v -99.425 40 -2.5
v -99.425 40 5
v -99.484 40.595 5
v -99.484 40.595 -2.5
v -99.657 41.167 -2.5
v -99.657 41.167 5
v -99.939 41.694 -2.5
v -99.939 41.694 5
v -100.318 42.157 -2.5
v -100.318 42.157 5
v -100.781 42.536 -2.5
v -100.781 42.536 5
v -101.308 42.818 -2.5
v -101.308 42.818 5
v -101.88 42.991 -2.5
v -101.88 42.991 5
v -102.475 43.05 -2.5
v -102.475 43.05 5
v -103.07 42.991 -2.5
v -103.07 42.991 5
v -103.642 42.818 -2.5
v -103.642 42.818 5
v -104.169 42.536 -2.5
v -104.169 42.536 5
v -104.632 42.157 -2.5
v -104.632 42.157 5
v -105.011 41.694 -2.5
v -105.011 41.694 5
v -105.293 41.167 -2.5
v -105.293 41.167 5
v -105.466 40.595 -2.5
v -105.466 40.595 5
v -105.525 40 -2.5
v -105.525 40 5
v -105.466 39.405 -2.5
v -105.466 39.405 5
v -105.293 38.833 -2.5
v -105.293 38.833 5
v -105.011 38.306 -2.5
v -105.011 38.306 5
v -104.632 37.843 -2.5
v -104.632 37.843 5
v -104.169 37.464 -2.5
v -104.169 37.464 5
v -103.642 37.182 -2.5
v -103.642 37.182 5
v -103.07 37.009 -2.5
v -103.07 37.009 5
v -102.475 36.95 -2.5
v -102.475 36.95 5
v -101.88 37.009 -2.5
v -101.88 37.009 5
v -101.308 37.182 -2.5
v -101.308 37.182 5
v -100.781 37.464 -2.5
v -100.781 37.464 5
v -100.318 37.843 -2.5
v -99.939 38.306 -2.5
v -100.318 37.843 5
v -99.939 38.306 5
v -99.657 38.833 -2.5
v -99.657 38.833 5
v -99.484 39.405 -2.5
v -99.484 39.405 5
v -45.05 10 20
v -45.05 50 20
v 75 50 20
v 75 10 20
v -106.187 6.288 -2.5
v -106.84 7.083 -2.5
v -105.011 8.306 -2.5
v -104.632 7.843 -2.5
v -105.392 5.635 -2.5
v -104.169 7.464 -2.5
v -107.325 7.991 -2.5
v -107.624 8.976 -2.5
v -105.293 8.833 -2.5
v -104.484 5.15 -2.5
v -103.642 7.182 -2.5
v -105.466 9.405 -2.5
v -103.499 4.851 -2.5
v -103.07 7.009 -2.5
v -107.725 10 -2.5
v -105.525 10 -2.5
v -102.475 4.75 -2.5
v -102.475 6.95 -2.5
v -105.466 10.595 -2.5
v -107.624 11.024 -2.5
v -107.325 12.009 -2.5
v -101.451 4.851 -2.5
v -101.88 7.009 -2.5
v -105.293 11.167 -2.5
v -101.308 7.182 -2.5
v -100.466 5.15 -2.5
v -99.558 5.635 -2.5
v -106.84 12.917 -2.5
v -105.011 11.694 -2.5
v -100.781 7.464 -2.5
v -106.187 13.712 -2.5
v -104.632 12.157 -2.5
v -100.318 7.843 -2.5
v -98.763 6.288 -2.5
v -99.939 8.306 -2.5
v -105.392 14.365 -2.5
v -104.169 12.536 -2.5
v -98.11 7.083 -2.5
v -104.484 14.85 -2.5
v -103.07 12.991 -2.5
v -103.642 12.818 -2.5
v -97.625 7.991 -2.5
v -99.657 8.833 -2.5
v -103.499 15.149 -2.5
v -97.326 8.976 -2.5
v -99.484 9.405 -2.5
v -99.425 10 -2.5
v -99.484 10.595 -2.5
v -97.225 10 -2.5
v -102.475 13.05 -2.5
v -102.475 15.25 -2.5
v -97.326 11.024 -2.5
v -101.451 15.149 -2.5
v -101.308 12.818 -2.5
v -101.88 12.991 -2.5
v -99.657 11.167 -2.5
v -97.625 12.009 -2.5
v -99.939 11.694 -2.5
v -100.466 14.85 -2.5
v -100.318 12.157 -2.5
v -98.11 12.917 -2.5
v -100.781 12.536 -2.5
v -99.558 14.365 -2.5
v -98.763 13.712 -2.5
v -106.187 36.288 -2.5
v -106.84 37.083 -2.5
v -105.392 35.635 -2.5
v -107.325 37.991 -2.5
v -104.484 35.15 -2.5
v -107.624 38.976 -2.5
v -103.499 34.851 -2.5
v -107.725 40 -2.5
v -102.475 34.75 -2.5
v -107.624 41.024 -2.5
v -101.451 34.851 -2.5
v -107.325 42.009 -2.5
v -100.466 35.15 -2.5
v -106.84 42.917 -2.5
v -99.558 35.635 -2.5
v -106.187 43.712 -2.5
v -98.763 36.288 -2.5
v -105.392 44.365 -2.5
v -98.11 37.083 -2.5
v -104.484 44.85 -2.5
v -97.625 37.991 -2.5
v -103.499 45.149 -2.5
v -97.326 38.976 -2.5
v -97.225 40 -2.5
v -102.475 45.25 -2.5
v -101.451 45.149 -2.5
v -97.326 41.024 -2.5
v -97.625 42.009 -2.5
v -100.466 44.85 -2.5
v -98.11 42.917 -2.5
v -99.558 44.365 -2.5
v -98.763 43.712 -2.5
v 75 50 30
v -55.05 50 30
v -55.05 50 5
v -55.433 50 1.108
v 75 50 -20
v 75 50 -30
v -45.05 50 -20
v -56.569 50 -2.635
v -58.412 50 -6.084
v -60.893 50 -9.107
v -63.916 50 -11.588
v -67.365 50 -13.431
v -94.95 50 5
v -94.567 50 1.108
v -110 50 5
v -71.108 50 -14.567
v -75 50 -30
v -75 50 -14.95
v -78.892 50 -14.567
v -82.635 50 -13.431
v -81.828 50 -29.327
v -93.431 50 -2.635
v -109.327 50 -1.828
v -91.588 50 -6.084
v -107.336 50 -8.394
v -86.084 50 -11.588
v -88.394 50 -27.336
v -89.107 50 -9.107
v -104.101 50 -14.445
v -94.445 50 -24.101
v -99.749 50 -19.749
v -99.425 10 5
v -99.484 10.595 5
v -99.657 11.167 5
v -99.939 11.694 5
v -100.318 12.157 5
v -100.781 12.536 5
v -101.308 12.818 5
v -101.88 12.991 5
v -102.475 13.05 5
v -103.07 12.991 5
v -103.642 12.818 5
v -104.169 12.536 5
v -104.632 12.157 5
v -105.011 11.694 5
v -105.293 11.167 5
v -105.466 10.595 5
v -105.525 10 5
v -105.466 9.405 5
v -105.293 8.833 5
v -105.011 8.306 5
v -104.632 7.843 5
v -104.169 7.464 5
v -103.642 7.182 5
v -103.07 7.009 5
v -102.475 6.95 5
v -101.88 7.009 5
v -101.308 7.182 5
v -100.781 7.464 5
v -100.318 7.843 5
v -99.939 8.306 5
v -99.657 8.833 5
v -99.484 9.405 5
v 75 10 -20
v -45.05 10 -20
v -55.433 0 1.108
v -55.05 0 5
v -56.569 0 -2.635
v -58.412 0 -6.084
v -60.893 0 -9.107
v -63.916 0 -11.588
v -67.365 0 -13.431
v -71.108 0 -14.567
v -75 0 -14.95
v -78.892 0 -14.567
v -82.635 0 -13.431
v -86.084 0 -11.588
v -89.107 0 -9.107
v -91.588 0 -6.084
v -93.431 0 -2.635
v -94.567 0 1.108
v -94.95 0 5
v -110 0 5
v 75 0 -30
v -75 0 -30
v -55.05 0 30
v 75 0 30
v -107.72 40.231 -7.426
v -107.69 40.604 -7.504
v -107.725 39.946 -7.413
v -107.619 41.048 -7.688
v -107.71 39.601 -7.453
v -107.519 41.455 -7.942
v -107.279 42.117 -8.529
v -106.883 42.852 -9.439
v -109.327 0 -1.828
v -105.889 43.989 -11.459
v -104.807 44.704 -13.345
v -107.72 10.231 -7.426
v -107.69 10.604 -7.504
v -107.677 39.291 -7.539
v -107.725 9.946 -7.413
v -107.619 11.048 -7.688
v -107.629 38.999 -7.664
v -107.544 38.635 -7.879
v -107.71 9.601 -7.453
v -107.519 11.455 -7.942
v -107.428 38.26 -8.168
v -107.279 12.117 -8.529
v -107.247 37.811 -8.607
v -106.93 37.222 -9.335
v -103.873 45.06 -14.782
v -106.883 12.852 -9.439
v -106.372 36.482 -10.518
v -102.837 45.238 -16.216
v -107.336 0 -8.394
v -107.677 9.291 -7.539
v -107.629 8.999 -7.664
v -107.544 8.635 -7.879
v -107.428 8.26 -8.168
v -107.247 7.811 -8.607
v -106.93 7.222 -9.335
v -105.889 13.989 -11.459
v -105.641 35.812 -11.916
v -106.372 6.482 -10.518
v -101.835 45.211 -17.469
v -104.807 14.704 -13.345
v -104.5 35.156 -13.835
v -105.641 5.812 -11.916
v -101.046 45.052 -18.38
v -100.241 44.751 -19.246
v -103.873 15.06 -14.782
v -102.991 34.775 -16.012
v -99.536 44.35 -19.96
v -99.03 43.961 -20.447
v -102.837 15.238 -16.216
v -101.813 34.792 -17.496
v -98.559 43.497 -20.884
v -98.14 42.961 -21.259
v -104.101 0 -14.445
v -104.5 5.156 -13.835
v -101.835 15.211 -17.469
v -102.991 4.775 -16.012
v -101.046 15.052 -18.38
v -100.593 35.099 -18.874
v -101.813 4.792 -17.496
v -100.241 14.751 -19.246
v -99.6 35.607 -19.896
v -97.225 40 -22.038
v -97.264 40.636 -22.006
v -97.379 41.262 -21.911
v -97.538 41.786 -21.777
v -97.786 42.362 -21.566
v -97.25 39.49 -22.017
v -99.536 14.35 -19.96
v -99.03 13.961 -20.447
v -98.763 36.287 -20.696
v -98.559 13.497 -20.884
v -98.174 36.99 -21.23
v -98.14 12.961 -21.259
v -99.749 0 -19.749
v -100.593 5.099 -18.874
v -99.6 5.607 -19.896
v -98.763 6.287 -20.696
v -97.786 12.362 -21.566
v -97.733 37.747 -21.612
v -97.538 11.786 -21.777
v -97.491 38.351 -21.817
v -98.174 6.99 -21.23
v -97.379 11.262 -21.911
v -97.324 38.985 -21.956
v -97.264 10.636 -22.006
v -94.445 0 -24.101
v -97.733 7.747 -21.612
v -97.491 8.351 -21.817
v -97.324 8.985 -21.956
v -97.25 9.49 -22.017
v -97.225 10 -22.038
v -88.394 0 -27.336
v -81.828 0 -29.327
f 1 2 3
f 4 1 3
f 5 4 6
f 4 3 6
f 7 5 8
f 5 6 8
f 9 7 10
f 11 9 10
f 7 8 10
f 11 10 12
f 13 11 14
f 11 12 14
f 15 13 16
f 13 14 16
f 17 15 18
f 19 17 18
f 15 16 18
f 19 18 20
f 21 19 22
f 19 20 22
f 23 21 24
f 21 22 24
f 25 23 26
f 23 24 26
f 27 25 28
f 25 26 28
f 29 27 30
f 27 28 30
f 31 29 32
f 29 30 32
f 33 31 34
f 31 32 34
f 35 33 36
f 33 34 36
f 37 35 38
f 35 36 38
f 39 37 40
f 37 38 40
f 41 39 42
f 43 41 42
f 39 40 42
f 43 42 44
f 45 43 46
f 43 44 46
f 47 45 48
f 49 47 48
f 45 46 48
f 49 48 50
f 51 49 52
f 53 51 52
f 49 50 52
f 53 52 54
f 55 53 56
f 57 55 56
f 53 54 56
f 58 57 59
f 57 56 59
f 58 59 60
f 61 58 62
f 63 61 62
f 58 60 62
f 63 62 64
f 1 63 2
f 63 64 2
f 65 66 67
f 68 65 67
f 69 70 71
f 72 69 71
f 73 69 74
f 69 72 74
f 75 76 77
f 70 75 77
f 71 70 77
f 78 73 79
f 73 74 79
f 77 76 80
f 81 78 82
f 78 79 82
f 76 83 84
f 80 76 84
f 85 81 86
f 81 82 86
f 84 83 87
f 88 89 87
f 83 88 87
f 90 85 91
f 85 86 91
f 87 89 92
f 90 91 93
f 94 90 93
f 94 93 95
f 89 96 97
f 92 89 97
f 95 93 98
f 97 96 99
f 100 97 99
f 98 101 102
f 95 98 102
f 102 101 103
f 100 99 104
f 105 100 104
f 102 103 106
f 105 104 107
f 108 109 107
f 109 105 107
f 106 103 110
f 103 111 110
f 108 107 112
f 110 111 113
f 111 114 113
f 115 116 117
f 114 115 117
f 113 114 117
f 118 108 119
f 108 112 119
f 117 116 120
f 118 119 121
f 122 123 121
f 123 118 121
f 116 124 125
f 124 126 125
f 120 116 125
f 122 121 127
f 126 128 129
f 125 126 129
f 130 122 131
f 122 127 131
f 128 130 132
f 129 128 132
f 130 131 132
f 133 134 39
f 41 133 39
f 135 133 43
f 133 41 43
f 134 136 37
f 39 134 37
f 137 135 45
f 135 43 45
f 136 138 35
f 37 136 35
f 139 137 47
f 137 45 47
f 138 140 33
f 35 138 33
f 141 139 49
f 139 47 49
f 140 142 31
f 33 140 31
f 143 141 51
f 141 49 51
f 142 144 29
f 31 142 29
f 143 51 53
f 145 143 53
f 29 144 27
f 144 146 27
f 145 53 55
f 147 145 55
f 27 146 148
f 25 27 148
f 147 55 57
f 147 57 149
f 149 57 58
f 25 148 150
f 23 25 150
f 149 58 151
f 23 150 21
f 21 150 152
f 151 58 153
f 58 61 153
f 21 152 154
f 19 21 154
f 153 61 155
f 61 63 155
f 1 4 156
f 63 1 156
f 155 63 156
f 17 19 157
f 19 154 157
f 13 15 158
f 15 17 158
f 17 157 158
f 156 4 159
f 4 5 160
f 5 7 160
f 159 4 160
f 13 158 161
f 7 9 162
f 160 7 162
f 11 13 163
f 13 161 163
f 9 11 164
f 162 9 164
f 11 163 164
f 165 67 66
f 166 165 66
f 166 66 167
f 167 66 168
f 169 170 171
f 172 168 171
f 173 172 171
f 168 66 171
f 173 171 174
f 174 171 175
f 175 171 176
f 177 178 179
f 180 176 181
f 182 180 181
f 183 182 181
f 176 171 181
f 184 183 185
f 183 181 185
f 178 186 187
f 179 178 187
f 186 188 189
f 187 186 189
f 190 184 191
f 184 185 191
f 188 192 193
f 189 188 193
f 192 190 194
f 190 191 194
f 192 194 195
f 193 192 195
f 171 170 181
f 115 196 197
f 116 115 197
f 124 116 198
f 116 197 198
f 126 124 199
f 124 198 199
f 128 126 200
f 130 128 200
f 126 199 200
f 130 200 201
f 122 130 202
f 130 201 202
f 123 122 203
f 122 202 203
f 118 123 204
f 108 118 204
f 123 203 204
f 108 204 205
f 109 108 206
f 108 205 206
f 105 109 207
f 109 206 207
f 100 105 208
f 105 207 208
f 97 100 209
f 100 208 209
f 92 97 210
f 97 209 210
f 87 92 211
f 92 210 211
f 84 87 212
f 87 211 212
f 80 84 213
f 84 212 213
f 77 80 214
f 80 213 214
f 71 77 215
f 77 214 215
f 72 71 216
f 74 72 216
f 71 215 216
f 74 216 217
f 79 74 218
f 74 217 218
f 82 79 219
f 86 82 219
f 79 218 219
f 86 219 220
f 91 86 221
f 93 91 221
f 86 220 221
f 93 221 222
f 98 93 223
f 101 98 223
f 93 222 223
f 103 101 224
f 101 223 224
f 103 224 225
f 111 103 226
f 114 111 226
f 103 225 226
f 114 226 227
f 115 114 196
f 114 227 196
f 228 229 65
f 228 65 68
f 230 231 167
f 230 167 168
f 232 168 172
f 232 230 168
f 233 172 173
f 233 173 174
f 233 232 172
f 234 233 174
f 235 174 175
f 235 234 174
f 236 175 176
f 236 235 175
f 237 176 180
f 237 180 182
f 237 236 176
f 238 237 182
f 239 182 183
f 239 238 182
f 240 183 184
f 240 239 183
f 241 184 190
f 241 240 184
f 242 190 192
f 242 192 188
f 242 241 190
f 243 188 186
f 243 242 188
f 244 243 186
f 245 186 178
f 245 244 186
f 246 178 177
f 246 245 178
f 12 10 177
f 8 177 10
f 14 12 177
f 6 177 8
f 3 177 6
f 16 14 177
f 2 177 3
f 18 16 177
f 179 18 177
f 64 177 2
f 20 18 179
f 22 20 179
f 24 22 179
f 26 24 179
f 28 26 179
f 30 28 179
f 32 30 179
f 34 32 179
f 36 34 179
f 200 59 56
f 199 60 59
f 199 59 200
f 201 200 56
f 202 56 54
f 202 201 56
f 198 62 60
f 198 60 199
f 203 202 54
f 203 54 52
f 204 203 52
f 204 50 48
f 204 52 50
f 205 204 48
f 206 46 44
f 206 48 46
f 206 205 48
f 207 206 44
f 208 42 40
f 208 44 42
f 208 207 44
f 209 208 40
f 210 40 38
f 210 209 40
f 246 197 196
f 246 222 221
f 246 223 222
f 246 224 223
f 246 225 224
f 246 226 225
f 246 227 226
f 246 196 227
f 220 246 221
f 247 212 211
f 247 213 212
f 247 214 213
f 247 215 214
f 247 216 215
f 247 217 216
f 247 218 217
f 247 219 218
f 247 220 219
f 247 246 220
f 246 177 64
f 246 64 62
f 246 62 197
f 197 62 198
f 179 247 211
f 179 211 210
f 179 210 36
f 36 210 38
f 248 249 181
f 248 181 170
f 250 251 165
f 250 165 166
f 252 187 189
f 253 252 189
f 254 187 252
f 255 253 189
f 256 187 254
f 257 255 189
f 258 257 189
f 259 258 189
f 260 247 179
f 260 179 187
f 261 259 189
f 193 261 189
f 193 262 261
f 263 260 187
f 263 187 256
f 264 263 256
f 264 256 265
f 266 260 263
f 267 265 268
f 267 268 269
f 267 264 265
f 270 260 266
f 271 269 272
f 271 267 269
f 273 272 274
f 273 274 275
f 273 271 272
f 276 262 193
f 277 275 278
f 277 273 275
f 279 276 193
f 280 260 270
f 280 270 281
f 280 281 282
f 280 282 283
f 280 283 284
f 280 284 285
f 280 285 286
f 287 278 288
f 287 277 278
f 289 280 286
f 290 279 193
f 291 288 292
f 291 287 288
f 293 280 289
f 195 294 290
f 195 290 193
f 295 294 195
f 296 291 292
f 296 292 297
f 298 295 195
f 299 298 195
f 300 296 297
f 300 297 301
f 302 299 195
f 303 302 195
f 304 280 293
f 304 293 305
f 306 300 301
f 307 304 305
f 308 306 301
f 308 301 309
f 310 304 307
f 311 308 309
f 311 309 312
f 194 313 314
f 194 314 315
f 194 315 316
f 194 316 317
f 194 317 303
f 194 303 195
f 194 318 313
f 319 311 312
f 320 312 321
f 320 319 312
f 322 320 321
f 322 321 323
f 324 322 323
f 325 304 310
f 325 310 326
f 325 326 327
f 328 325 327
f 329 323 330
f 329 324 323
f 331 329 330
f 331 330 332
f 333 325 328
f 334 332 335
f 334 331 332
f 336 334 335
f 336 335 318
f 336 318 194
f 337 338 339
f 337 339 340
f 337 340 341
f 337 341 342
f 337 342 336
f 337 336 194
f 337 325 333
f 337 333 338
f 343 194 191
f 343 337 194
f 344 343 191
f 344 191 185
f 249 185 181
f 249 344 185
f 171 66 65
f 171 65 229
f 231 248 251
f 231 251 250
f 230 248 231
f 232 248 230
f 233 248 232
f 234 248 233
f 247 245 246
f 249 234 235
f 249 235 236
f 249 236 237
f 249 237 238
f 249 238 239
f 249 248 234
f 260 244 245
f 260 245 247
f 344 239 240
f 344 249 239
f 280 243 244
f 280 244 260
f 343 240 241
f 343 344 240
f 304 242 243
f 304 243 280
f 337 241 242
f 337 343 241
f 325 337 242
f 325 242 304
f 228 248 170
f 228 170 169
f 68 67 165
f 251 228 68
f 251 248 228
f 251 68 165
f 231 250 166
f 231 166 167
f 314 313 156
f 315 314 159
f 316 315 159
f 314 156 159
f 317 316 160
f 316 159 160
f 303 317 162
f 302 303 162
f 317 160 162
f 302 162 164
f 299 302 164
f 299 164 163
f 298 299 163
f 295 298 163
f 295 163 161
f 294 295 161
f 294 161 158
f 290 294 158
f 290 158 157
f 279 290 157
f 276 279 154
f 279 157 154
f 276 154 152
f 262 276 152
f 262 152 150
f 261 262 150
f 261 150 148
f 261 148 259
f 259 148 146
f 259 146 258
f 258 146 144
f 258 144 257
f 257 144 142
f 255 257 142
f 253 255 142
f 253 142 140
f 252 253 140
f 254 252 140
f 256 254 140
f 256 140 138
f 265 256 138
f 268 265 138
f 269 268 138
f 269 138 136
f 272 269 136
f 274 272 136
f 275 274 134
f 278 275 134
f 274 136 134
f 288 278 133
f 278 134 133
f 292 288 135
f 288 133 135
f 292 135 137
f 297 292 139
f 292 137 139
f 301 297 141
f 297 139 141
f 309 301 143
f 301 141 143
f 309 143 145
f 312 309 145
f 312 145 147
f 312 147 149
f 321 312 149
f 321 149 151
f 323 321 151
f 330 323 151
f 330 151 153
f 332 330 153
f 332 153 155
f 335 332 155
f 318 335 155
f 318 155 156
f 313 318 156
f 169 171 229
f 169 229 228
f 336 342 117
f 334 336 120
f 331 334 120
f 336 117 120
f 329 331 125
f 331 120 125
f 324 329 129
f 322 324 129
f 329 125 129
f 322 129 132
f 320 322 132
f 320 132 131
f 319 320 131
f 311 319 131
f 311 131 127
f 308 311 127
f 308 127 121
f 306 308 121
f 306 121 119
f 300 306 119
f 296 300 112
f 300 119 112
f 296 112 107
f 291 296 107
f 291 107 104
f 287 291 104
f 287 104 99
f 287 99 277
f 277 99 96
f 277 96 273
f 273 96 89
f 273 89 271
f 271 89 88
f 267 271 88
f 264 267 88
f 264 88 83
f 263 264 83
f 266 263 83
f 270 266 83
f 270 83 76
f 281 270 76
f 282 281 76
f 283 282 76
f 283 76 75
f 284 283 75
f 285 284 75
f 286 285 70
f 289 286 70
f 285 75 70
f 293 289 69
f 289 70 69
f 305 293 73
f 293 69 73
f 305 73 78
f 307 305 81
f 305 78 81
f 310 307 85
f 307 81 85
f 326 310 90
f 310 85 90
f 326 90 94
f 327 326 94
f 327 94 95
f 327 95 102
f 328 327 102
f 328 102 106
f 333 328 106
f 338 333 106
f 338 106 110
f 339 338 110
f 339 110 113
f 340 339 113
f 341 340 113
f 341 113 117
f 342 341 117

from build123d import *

# Parameters (mm, degrees)
BOSS_EXTRUDE1_DEPTH = 50
SKETCH3_R           = 3.05
CUT_EXTRUDE1_DEPTH  = 7.5
SKETCH4_R           = 5.25
CUT_EXTRUDE2_DEPTH  = 50
SKETCH5_W           = 148.528027858
SKETCH5_H           = 40
CUT_EXTRUDE3_DEPTH  = 40


with BuildPart() as part:
    # Sketch2 → Boss-Extrude1 (new body)
    with BuildSketch(Plane(origin=(0, 0, 0), x_dir=(1, 0, 0), z_dir=(0, 1, 0))):
        with BuildLine():
            Line((-75, 30), (75, 30))
            Line((75, 30), (75, -30))
            Line((75, -30), (-55.05, -30))
            Line((-55.05, -30), (-55.05, -5))
            ThreePointArc((-55.05, -5), (-75, 14.95), (-94.95, -5))
            Line((-94.95, -5), (-110, -5))
            ThreePointArc((-110, -5), (-99.748737342, 19.748737342), (-75, 30))
        make_face()
    extrude(amount=BOSS_EXTRUDE1_DEPTH)

    # Sketch3 → Cut-Extrude1 (cut)
    with BuildSketch(Plane.XY.offset(5)):
        with Locations((-102.475, 40)):
            Circle(SKETCH3_R)
        with Locations((-102.475, 10)):
            Circle(SKETCH3_R)
    extrude(amount=-CUT_EXTRUDE1_DEPTH, mode=Mode.SUBTRACT)

    # Sketch4 → Cut-Extrude2 (cut)
    with BuildSketch(Plane.XY.offset(-2.5)):
        with Locations((-102.475, 40)):
            Circle(SKETCH4_R)
        with Locations((-102.475, 10)):
            Circle(SKETCH4_R)
    extrude(amount=-CUT_EXTRUDE2_DEPTH, mode=Mode.SUBTRACT)

    # Sketch5 → Cut-Extrude3 (cut)
    with BuildSketch(Plane(origin=(0, 50, 0), x_dir=(1, 0, 0), z_dir=(0, 1, 0))):
        with Locations((29.214013929, 0)):
            Rectangle(SKETCH5_W, SKETCH5_H)
    extrude(amount=-CUT_EXTRUDE3_DEPTH, mode=Mode.SUBTRACT)


solid = part.part
